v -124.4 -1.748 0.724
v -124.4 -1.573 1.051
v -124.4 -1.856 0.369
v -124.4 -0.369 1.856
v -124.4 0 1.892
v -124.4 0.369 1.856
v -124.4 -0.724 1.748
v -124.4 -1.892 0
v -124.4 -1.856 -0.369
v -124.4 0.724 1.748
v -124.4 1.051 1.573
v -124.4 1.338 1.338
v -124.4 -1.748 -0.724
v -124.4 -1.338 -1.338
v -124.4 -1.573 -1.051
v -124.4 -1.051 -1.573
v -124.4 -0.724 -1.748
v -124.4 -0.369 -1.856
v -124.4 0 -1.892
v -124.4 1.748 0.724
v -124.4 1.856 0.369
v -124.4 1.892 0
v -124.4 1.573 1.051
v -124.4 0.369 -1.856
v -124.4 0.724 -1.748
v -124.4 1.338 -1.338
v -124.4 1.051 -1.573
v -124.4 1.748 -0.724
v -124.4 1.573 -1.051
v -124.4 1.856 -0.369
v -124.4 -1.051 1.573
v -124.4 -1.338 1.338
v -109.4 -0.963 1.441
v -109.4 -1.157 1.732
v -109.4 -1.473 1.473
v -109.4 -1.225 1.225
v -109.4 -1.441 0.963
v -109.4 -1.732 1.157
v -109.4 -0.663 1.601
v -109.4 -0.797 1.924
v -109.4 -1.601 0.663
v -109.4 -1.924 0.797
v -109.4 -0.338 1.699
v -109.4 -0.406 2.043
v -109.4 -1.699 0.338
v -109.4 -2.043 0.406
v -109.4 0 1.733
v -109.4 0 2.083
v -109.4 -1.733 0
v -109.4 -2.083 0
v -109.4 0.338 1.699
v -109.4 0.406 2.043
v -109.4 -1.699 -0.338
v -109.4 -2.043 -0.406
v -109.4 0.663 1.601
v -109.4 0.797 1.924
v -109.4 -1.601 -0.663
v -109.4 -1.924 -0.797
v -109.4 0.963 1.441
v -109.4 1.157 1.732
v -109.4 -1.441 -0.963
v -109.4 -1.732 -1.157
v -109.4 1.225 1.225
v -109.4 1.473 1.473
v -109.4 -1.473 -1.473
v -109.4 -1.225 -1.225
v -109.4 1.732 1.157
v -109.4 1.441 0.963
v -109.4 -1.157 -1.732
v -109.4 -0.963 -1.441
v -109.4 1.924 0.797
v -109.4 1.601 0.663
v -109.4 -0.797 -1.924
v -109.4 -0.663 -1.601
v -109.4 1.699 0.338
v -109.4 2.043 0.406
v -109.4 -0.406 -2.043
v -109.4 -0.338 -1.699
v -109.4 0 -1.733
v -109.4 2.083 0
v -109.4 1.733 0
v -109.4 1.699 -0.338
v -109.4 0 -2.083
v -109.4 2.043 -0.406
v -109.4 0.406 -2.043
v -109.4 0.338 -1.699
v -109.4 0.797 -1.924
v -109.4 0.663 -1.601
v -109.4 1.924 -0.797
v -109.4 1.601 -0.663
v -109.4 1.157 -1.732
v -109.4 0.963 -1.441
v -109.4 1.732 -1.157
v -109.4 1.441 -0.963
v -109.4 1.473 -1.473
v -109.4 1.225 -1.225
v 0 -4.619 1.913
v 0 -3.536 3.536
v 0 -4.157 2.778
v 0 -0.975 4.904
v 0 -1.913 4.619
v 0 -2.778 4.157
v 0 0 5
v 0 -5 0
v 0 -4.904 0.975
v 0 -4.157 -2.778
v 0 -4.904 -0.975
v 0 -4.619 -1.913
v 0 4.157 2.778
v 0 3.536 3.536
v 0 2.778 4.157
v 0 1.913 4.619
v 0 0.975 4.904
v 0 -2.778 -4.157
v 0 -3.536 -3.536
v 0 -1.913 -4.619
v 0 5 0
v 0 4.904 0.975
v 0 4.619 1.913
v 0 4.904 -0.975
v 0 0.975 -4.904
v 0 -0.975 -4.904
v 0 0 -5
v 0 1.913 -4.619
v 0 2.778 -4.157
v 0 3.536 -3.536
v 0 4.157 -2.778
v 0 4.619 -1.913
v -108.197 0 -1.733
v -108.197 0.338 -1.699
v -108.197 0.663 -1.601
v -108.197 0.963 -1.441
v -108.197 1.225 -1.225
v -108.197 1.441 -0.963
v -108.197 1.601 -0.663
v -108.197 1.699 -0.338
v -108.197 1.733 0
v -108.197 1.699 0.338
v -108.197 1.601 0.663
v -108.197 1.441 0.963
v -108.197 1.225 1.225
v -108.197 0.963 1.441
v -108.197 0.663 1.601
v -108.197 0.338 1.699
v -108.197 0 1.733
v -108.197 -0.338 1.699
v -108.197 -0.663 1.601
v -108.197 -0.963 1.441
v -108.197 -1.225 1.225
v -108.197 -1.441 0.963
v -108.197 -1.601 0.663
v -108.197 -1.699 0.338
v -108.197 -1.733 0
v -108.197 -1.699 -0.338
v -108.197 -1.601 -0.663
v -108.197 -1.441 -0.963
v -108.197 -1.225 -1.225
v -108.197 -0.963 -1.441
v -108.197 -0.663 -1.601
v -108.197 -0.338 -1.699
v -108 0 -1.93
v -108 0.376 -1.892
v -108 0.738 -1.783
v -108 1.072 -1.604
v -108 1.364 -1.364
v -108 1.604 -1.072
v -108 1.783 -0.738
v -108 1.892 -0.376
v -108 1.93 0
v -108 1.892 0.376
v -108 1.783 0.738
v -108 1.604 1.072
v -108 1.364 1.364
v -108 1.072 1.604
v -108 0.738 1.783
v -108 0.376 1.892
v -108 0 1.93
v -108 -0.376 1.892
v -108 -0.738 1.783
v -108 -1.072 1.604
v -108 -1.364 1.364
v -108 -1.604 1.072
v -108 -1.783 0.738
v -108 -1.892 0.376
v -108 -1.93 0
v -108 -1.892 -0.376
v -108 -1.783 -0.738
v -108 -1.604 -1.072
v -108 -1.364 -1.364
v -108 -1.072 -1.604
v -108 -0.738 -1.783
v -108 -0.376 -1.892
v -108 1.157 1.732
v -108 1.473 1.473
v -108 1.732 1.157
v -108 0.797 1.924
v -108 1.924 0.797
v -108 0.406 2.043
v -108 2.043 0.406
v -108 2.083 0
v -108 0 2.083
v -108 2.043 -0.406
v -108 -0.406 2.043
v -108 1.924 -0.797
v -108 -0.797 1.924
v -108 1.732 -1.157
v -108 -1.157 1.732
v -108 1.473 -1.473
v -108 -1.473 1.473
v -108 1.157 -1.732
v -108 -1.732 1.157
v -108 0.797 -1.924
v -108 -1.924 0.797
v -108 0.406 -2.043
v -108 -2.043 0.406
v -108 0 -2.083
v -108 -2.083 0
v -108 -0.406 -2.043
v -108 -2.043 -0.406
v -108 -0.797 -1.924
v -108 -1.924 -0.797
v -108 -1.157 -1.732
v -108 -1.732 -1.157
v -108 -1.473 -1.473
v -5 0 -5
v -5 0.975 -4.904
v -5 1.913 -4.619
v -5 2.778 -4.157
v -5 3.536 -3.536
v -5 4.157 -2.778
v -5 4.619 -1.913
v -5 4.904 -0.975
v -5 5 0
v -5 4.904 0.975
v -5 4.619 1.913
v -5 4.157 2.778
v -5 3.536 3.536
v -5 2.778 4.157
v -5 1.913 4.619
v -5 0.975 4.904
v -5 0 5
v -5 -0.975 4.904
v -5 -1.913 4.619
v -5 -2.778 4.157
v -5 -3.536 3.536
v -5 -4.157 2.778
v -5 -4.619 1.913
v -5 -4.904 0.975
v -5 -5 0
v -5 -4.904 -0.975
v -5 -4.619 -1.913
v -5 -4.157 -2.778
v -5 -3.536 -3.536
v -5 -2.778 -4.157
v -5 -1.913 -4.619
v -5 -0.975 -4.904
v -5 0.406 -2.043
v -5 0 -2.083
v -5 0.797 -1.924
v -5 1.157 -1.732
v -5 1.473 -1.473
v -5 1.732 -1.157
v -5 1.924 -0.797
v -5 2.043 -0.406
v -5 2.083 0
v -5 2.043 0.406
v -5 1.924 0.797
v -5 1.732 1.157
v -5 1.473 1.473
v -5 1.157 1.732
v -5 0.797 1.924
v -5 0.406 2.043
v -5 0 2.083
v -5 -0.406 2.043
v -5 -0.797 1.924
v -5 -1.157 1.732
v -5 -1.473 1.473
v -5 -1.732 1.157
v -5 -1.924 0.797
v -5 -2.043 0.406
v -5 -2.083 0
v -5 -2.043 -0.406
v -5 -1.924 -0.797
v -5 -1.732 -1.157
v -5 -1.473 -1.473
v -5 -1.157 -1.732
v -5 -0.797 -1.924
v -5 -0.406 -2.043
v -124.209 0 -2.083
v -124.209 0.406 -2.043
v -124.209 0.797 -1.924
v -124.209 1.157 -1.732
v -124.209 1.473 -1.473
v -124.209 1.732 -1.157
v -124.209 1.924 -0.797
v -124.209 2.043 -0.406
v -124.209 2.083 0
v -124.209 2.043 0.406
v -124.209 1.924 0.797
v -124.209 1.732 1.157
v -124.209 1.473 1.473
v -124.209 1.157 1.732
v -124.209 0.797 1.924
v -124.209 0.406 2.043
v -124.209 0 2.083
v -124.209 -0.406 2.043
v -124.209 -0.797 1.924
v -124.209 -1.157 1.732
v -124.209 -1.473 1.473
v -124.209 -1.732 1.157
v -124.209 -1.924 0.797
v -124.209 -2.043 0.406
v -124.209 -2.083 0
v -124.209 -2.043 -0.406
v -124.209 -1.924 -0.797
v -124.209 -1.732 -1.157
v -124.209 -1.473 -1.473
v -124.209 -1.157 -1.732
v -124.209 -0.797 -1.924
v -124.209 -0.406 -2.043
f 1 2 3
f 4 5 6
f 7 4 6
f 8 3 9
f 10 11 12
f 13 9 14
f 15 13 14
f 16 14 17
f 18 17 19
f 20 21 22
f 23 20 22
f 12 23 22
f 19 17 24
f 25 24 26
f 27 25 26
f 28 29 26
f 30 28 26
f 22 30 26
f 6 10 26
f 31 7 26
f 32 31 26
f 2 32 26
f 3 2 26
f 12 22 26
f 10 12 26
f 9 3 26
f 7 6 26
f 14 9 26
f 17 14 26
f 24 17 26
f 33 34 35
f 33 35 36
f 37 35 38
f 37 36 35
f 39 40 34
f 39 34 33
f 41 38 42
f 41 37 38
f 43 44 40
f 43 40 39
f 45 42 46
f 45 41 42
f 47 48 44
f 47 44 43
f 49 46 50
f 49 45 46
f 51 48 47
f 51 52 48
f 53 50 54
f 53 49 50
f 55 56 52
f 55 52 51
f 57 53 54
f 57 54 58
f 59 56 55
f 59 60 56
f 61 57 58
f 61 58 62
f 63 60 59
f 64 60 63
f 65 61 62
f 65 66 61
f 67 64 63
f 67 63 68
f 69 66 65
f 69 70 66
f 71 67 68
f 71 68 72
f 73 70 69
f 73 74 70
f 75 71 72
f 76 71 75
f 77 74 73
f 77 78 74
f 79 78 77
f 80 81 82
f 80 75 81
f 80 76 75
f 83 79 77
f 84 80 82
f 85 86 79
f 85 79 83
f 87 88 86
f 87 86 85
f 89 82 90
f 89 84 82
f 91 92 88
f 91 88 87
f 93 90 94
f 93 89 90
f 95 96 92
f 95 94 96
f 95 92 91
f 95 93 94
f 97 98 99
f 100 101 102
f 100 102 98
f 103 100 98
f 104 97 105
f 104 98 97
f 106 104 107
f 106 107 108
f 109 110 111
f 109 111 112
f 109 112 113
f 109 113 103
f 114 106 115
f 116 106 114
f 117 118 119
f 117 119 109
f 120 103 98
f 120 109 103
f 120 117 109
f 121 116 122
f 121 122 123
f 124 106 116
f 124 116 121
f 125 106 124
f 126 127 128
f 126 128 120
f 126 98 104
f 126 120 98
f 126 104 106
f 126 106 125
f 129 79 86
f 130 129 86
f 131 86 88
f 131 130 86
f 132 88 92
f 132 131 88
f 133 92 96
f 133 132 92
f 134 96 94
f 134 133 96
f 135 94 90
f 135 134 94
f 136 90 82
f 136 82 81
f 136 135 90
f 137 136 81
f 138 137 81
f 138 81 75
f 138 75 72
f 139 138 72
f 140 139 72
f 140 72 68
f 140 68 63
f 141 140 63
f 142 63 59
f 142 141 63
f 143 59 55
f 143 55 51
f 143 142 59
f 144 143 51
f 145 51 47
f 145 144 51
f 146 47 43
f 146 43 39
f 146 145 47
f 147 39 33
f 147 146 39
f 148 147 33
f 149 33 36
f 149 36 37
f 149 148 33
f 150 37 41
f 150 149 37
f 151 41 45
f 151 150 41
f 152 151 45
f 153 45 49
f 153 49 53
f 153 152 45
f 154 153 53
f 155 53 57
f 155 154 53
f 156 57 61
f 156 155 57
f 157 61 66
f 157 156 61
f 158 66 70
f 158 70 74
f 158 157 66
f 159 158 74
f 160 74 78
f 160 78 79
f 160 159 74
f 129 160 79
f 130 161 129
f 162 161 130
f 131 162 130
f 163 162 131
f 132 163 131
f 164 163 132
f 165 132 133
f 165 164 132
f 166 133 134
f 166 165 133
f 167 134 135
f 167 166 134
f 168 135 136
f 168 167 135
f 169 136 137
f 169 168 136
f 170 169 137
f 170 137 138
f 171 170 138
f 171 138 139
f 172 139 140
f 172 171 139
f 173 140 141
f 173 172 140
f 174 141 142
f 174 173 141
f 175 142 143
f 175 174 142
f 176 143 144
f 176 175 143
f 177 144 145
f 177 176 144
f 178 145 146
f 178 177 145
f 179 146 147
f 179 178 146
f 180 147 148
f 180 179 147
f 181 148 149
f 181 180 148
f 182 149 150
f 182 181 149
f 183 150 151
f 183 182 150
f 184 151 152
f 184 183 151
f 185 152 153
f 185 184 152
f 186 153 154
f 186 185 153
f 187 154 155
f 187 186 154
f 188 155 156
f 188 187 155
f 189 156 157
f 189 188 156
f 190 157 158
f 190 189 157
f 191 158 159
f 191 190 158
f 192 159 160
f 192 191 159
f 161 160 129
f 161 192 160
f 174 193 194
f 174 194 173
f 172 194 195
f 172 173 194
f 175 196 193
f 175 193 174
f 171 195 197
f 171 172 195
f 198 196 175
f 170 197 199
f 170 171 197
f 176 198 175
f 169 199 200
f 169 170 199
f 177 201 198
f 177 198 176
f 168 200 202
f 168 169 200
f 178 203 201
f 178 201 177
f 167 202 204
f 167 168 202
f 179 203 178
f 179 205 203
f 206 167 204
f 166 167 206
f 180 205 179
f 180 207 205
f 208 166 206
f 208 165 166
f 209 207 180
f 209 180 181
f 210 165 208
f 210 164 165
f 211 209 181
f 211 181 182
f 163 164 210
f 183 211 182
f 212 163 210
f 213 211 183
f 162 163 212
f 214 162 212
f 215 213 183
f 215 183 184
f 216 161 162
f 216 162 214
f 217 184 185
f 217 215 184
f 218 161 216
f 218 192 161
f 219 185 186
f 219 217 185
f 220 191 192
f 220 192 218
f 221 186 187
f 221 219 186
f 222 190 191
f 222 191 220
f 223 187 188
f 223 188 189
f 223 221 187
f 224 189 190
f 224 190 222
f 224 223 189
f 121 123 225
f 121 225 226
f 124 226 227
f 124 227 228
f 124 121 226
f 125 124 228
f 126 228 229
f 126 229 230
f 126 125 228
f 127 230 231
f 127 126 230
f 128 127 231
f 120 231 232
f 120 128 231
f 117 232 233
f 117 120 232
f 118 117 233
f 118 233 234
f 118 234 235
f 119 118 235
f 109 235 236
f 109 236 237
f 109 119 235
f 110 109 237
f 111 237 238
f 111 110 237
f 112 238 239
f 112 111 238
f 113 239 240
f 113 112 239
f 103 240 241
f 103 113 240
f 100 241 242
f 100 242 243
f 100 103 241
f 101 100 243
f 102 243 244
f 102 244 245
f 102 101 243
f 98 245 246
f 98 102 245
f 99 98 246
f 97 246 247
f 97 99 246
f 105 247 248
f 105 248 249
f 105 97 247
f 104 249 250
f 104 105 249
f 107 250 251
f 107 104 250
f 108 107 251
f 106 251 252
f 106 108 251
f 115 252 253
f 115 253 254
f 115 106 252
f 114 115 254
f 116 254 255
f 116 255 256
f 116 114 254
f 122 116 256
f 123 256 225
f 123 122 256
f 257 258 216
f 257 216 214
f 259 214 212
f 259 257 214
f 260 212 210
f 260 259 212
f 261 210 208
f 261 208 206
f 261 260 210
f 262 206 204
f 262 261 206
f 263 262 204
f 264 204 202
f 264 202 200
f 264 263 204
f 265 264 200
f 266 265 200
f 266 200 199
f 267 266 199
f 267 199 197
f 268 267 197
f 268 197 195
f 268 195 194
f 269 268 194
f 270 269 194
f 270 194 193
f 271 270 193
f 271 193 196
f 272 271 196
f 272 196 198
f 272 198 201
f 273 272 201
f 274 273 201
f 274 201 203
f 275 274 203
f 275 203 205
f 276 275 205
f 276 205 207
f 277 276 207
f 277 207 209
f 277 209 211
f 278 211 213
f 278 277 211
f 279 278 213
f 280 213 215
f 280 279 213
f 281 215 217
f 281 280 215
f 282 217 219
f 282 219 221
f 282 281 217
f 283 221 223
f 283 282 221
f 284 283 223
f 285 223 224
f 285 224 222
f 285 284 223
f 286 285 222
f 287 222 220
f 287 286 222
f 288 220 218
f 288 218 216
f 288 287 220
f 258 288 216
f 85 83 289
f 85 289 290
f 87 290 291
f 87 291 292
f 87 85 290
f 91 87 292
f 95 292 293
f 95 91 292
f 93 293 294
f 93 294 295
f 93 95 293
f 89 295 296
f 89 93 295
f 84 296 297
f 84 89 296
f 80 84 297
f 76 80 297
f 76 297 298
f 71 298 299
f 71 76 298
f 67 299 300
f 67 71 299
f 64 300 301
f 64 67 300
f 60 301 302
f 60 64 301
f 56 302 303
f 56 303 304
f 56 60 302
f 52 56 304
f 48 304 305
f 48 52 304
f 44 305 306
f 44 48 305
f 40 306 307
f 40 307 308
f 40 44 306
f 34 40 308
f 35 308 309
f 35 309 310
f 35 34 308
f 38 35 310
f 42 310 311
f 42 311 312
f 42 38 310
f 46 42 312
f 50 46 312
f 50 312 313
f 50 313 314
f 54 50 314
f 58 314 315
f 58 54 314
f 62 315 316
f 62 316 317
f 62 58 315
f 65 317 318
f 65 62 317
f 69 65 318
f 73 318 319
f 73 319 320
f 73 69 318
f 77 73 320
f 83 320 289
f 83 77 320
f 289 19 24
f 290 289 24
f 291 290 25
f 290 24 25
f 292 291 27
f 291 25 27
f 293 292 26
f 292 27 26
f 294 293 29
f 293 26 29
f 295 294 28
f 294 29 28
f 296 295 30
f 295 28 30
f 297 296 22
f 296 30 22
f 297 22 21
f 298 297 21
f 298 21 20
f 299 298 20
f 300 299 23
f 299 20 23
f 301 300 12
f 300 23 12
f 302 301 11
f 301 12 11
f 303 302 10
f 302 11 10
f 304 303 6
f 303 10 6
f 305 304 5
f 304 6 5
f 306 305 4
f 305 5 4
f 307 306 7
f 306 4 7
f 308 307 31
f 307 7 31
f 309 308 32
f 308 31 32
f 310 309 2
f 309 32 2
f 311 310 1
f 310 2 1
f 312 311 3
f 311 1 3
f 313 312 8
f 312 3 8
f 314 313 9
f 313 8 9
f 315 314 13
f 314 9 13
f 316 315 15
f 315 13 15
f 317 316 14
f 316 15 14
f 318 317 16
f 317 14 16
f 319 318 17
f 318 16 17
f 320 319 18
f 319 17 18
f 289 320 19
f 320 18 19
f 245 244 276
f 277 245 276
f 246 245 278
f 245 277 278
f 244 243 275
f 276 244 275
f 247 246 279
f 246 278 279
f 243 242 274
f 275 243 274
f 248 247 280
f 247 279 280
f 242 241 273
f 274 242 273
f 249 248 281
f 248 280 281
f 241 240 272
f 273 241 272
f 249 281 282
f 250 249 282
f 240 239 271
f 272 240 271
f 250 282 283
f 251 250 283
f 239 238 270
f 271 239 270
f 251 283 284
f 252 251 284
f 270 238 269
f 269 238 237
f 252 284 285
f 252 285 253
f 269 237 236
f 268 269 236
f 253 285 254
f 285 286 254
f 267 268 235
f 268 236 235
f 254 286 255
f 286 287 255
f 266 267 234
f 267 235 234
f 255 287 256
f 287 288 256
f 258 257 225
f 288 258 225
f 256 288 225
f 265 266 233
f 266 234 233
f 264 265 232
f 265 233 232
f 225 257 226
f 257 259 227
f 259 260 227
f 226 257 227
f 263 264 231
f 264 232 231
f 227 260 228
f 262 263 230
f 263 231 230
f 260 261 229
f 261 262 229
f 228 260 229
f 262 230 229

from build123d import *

# Parameters (mm, degrees)
SKETCH1_R           = 4.99999
SKETCH1_R_2         = 2.182749
SKETCH1_R_3         = 2.0828
SKETCH1_R_4         = 1.932813
SKETCH1_R_5         = 1.732788
BOSS_EXTRUDE2_DEPTH = 4.99999
SKETCH1_5_R         = 2.0828
BOSS_EXTRUDE3_DEPTH = 107.999884076
BOSS_EXTRUDE4_START = -107.999884
SKETCH1_6_R         = 1.932813
BOSS_EXTRUDE4_DEPTH = 0.199898
BOSS_EXTRUDE5_START = -108.199782
SKETCH1_7_R         = 1.732788
BOSS_EXTRUDE5_DEPTH = 1.199896
BOSS_EXTRUDE6_START = -109.399678
SKETCH1_8_R         = 2.0828
BOSS_EXTRUDE6_DEPTH = 14.99997
CHAMFER1_SIZE       = 0.2032
CHAMFER2_SIZE       = 0.1905


with BuildPart() as part:
    # Sketch1 → Boss-Extrude2 (new body)
    # profile 1 of 5: a face of its own
    with BuildSketch(Plane(origin=(0, 0, 0), x_dir=(0, 0, -1), z_dir=(1, 0, 0))):
        Circle(SKETCH1_R)
        Circle(SKETCH1_R_2, mode=Mode.SUBTRACT)
    # profile 2 of 5: a face of its own
    with BuildSketch(Plane(origin=(0, 0, 0), x_dir=(0, 0, -1), z_dir=(1, 0, 0))):
        Circle(SKETCH1_R_2)
        Circle(SKETCH1_R_3, mode=Mode.SUBTRACT)
    # profile 3 of 5: a face of its own
    with BuildSketch(Plane(origin=(0, 0, 0), x_dir=(0, 0, -1), z_dir=(1, 0, 0))):
        Circle(SKETCH1_R_3)
        Circle(SKETCH1_R_4, mode=Mode.SUBTRACT)
    # profile 4 of 5: a face of its own
    with BuildSketch(Plane(origin=(0, 0, 0), x_dir=(0, 0, -1), z_dir=(1, 0, 0))):
        Circle(SKETCH1_R_4)
        Circle(SKETCH1_R_5, mode=Mode.SUBTRACT)
    # profile 5 of 5: a face of its own
    with BuildSketch(Plane(origin=(0, 0, 0), x_dir=(0, 0, -1), z_dir=(1, 0, 0))):
        Circle(SKETCH1_R_5)
    extrude(amount=-BOSS_EXTRUDE2_DEPTH)

    # Sketch1<5> → Boss-Extrude3 (add)
    with BuildSketch(Plane(origin=(0, 0, 0), x_dir=(0, 0, -1), z_dir=(1, 0, 0))):
        Circle(SKETCH1_5_R)
    extrude(amount=-BOSS_EXTRUDE3_DEPTH)

    # Sketch1<6> → Boss-Extrude4 (add)
    with BuildSketch(Plane(origin=(0, 0, 0), x_dir=(0, 0, -1), z_dir=(1, 0, 0)).offset(BOSS_EXTRUDE4_START)):
        Circle(SKETCH1_6_R)
    extrude(amount=-BOSS_EXTRUDE4_DEPTH)

    # Sketch1<7> → Boss-Extrude5 (add)
    with BuildSketch(Plane(origin=(0, 0, 0), x_dir=(0, 0, -1), z_dir=(1, 0, 0)).offset(BOSS_EXTRUDE5_START)):
        Circle(SKETCH1_7_R)
    extrude(amount=-BOSS_EXTRUDE5_DEPTH)

    # Sketch1<8> → Boss-Extrude6 (add)
    with BuildSketch(Plane(origin=(0, 0, 0), x_dir=(0, 0, -1), z_dir=(1, 0, 0)).offset(BOSS_EXTRUDE6_START)):
        Circle(SKETCH1_8_R)
    extrude(amount=-BOSS_EXTRUDE6_DEPTH)

    # Chamfer1
    # the kernel refuses this chamfer: 0.2032 mm, written as the material it takes off along each edge
    with BuildSketch(Plane(origin=(-108.199782, 0, 0), x_dir=(0, 0, -1), z_dir=(0, -1, 0))) as chamfer1_piece_1_section:
        Polygon((1.932813 - CHAMFER1_SIZE, 0), (1.932813, CHAMFER1_SIZE), (1.932813, 0), align=None)
    chamfer1_piece_1 = revolve(axis=Axis((-108.199782, 0, 0), (1, 0, 0)), mode=Mode.PRIVATE)
    chamfer1_piece_1 = chamfer1_piece_1 - Plane(origin=(-108.102785336, 0, 0), x_dir=(0, 0, -1), z_dir=(1, 0, 0)) * Cylinder(1.732788, 8, mode=Mode.PRIVATE)
    chamfer1_piece_1 = split(chamfer1_piece_1, bisect_by=Plane(origin=(-107.999884076, 0, 1.83568926), z_dir=(-1, 0, 0)), keep=Keep.TOP, mode=Mode.PRIVATE)
    add(chamfer1_piece_1, mode=Mode.SUBTRACT)

    # Chamfer2
    chamfer2_edges = [part.edges().sort_by_distance(p)[0] for p in [
        (-124.399648, 0, 2.0828),
    ]]
    chamfer(chamfer2_edges, length=CHAMFER2_SIZE)


solid = part.part
